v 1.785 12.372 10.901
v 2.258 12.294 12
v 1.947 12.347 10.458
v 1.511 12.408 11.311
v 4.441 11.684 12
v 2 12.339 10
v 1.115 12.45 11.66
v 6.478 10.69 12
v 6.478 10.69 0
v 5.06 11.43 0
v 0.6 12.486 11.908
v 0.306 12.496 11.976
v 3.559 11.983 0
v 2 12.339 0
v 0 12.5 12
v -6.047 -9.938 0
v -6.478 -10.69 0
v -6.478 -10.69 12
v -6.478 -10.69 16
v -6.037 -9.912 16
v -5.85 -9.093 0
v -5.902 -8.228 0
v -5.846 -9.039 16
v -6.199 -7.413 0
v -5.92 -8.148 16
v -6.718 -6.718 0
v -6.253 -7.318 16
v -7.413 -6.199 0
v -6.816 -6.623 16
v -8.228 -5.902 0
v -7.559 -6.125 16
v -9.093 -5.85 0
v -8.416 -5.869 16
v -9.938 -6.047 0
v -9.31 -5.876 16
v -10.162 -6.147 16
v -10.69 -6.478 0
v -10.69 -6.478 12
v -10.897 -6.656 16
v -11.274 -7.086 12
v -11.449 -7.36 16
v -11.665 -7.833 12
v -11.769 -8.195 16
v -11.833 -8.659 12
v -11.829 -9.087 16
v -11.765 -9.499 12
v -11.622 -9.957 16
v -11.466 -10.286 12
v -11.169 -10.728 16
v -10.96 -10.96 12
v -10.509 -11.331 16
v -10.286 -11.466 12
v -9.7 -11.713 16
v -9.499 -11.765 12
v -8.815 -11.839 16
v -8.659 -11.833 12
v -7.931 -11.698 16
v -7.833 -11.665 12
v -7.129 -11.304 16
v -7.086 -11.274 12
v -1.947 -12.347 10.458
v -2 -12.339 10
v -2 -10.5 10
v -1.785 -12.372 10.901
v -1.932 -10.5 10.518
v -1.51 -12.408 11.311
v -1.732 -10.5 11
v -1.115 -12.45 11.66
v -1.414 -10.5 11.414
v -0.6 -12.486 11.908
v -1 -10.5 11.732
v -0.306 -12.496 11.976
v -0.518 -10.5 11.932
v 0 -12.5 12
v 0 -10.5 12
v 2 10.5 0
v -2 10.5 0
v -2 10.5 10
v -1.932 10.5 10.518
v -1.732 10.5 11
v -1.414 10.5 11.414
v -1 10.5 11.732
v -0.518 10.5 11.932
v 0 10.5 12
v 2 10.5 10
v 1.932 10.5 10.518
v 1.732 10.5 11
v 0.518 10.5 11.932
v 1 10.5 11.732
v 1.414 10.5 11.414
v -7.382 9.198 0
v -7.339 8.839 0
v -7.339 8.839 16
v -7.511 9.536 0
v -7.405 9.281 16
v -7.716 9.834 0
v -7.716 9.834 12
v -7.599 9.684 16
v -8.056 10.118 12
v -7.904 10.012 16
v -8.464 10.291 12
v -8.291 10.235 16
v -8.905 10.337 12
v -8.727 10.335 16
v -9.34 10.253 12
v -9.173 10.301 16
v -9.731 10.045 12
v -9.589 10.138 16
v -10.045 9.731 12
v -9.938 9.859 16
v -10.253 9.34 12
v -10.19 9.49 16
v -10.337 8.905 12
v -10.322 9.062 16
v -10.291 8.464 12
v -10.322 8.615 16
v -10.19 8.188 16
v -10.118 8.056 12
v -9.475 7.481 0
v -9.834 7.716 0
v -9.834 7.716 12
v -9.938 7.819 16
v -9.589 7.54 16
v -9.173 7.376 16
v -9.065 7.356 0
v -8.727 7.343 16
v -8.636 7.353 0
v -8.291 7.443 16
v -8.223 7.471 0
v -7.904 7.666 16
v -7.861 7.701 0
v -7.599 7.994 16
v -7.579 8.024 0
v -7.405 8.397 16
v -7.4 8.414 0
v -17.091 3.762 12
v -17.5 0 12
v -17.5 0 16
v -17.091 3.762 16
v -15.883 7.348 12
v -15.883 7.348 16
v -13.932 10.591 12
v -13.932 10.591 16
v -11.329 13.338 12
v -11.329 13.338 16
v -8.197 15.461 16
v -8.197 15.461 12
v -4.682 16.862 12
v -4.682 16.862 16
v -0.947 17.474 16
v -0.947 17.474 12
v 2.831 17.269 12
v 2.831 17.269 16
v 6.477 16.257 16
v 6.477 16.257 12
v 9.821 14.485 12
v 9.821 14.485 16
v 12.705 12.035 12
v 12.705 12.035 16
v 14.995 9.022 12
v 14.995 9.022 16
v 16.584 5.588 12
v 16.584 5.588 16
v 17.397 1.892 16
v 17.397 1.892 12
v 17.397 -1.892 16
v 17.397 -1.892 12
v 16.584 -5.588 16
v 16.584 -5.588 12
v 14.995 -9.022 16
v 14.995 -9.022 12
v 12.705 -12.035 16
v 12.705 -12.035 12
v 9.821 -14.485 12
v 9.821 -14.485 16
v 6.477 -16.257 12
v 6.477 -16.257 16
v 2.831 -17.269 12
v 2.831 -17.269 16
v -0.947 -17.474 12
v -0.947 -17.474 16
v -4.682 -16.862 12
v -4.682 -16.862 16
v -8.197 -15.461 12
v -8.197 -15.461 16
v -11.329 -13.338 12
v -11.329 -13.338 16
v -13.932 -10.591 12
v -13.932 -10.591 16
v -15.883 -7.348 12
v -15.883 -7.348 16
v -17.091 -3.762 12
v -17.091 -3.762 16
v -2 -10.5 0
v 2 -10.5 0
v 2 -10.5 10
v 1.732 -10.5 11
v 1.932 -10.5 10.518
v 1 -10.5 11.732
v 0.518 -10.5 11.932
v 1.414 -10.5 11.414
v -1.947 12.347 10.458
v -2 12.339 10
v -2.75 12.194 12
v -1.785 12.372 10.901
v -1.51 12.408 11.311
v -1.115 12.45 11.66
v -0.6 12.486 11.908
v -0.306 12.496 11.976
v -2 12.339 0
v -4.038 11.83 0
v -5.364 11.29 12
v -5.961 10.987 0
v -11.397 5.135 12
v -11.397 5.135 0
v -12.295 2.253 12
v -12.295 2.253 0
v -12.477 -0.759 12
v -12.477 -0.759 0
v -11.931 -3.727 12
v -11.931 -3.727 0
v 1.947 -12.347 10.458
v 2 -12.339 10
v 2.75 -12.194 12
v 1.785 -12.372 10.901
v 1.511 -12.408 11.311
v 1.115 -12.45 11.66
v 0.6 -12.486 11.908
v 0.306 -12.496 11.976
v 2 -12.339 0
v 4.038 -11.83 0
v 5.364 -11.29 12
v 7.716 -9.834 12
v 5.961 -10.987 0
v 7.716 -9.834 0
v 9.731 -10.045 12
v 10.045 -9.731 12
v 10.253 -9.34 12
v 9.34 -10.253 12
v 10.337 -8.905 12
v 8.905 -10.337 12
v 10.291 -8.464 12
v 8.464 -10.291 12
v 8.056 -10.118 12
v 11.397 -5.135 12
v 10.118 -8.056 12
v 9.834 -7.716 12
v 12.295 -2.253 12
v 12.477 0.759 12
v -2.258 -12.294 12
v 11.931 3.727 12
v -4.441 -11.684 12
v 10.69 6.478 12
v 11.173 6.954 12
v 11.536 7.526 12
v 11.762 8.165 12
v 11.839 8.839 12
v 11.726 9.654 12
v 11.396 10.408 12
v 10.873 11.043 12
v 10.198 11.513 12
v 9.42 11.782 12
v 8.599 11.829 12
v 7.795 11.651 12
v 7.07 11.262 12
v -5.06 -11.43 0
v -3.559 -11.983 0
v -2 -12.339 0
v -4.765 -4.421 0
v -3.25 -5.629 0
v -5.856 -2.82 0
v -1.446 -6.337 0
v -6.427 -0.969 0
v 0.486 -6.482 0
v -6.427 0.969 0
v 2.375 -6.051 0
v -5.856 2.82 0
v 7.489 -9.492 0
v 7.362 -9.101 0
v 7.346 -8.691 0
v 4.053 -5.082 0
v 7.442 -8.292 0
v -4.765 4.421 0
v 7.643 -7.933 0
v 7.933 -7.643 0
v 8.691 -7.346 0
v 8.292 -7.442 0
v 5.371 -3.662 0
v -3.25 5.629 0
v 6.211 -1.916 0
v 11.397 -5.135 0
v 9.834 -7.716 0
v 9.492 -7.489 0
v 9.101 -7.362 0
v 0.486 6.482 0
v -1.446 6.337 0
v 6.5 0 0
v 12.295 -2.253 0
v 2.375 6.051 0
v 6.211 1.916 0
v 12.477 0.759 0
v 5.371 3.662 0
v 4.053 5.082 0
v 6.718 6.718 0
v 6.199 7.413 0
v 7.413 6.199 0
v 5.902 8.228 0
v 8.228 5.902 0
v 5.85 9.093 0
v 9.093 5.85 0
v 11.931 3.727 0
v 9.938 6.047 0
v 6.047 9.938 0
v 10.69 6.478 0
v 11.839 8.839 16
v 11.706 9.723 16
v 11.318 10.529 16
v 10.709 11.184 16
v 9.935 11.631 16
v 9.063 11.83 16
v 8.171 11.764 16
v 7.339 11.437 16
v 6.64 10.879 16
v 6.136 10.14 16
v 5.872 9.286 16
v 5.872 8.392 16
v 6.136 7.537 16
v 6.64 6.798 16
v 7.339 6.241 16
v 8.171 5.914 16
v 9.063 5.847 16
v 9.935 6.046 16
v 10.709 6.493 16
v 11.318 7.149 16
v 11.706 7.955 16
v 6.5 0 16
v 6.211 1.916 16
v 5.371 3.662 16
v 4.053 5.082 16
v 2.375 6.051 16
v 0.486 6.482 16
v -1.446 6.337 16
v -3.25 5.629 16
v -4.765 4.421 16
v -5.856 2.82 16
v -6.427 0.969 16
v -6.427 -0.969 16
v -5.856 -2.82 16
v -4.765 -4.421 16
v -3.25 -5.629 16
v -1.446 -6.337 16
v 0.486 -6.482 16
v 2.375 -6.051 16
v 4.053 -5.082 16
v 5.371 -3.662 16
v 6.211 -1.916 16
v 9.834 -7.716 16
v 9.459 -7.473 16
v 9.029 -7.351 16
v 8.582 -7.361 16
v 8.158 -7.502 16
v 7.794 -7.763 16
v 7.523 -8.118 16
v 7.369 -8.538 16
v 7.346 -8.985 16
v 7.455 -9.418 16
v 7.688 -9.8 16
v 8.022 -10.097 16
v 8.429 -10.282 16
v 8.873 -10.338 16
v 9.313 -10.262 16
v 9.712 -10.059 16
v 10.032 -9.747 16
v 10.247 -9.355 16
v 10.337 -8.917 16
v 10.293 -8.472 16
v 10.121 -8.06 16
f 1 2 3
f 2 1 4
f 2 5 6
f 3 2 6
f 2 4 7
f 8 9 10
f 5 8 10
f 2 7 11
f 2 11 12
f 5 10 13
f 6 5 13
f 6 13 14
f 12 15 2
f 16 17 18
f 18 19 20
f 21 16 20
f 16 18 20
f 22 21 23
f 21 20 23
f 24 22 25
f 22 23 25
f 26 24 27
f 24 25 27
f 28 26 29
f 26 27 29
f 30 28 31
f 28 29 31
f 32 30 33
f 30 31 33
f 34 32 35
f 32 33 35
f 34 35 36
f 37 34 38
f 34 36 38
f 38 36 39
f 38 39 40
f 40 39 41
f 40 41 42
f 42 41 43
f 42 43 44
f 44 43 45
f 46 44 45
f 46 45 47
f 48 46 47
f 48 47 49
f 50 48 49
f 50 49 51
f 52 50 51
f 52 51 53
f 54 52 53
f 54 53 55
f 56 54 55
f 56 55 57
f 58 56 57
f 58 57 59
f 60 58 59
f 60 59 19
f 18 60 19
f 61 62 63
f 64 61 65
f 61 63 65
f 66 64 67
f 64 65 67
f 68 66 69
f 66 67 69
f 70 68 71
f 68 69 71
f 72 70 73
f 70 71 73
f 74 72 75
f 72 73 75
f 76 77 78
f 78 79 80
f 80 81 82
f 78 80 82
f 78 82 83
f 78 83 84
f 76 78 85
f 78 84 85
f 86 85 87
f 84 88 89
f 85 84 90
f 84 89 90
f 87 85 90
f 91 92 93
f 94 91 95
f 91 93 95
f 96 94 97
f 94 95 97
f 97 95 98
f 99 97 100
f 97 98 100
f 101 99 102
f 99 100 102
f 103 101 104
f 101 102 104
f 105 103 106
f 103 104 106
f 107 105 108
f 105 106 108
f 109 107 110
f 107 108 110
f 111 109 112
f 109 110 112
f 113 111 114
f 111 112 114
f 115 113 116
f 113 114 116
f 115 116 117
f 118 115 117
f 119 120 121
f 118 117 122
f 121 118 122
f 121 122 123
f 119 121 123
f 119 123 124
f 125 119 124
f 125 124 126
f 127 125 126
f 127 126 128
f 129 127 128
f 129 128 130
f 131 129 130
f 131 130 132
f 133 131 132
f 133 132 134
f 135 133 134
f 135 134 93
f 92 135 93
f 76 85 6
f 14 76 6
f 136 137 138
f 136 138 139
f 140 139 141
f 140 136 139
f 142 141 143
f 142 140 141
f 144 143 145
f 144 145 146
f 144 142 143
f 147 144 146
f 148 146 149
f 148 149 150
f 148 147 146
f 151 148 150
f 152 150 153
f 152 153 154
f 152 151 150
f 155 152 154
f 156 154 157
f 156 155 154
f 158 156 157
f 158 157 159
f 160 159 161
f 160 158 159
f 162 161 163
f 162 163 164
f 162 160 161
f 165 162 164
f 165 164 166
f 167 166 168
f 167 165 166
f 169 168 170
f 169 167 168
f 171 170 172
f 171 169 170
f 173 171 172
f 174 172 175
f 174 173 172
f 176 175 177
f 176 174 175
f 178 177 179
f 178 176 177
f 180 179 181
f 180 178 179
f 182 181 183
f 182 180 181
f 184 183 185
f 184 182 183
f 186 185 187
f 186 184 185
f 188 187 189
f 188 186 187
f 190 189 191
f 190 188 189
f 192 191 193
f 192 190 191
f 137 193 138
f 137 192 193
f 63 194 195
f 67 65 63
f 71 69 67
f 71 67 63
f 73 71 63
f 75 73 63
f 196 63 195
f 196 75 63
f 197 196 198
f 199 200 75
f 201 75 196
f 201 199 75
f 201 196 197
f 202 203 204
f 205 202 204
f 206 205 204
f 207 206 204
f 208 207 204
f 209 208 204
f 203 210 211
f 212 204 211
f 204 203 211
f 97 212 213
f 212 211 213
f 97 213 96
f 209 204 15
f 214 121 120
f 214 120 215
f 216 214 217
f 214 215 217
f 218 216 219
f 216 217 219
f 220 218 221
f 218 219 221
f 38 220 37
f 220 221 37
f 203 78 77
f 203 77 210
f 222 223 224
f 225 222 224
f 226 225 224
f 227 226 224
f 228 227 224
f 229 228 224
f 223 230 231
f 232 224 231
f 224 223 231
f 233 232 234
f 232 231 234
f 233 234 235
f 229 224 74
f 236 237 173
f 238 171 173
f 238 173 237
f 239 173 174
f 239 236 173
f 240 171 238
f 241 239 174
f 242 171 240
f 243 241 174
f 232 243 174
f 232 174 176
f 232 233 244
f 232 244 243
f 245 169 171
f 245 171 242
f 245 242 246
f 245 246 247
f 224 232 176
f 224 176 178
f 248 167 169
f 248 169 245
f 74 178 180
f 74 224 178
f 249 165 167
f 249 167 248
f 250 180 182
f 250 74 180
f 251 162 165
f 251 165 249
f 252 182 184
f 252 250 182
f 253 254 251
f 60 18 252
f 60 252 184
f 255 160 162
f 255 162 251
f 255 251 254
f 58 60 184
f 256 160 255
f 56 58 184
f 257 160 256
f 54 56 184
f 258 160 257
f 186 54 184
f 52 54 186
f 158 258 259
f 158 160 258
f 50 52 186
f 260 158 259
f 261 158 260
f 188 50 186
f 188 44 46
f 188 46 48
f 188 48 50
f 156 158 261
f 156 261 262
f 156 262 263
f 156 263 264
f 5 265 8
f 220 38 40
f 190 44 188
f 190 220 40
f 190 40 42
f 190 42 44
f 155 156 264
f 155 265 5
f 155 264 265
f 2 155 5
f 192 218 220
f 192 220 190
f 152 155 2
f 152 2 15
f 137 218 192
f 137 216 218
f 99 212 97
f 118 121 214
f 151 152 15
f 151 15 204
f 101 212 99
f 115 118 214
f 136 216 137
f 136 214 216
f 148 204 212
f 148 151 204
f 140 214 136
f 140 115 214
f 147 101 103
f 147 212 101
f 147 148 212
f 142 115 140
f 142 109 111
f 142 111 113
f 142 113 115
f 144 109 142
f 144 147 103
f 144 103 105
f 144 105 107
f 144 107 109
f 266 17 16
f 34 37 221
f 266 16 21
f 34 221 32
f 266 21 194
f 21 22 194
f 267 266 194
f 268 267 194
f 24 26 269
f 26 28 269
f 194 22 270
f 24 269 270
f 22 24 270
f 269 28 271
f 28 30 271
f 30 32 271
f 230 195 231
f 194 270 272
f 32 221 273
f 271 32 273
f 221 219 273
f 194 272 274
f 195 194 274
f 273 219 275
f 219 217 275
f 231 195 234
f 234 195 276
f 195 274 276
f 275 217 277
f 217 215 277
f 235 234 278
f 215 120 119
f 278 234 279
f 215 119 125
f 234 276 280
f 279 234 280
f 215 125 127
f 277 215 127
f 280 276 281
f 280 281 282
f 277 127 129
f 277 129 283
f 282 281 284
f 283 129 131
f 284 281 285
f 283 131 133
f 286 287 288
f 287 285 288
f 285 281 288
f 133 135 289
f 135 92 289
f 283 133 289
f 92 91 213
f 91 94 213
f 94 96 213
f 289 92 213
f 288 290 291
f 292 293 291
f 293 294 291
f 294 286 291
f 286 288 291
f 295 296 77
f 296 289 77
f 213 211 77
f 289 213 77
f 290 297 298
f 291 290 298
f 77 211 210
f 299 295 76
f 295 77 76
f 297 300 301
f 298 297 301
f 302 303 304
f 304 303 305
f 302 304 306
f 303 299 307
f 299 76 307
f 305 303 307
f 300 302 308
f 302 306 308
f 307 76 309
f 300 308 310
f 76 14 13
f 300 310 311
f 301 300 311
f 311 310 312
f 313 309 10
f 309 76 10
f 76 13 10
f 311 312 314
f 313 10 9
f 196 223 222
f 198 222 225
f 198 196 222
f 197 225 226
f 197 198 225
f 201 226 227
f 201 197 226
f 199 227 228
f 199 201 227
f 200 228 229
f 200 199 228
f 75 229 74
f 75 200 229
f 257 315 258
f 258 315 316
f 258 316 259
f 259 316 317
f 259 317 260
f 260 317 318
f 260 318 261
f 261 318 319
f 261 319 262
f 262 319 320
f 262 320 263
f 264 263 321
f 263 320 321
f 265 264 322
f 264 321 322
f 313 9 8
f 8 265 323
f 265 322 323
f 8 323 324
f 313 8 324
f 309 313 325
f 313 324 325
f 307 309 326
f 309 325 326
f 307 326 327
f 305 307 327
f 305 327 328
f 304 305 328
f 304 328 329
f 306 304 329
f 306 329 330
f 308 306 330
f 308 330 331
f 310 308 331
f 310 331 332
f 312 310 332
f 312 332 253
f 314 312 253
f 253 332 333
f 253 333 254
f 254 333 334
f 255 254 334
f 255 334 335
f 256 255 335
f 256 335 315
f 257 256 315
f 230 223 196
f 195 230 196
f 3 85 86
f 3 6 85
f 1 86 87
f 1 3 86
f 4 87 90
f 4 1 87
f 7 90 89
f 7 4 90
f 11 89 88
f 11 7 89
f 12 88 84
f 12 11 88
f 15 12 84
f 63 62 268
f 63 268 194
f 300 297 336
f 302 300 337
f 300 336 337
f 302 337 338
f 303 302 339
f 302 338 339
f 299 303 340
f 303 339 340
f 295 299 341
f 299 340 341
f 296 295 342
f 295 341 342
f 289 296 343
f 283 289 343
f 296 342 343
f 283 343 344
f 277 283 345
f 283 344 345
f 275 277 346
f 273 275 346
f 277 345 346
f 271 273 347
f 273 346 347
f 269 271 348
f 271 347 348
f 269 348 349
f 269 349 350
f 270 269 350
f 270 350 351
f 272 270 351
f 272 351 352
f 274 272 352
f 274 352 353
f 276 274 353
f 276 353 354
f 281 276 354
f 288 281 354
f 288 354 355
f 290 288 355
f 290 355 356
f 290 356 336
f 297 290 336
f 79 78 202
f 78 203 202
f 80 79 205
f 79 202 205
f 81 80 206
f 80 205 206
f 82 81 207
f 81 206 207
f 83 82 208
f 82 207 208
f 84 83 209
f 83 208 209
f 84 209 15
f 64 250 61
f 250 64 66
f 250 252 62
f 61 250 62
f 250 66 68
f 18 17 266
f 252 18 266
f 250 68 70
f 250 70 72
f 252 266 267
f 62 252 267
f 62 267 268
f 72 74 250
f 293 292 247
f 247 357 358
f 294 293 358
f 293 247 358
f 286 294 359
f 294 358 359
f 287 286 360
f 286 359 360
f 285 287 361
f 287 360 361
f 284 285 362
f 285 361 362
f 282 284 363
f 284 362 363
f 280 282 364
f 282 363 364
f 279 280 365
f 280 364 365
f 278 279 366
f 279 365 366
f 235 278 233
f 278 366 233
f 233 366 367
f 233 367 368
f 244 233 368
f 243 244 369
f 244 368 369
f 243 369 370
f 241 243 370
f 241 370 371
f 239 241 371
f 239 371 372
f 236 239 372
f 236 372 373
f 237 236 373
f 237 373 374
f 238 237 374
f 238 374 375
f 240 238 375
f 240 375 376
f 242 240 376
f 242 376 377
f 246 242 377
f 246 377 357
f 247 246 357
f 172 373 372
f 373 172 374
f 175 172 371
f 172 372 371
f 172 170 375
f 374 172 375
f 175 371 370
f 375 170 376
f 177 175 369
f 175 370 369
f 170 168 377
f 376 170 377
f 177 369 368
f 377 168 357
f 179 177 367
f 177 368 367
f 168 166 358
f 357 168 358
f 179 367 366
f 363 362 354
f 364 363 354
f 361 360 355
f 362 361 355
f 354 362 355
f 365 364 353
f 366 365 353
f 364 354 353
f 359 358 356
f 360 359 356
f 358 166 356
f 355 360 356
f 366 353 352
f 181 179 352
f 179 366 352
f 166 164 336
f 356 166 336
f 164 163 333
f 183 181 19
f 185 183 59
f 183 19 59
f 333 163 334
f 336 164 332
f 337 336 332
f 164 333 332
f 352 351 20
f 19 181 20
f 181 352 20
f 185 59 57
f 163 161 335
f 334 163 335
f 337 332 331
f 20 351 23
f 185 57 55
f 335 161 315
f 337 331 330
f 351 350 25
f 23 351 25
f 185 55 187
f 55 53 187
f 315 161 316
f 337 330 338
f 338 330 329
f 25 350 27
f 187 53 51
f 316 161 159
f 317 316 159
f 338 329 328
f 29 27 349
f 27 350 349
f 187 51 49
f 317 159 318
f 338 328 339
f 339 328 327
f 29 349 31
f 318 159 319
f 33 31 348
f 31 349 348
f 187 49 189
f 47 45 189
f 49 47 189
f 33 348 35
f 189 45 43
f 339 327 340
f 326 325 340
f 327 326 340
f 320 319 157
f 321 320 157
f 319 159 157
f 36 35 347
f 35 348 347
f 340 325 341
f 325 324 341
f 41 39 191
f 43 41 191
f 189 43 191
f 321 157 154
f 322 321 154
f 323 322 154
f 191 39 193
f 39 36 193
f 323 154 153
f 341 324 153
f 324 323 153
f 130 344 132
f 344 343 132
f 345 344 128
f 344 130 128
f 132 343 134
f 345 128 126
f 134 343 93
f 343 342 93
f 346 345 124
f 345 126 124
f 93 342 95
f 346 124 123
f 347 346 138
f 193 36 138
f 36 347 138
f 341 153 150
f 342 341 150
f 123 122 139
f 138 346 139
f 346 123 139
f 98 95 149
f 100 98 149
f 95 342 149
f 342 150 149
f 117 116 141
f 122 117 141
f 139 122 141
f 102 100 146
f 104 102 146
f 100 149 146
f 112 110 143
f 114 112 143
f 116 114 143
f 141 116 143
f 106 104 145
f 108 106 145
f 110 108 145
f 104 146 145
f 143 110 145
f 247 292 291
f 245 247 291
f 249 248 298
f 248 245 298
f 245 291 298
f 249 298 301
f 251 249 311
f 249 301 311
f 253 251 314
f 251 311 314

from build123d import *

# Parameters (mm, degrees)
SKETCH_1_R          = 12.5
EXTRUDE_1_DEPTH     = 12
SKETCH_2_W          = 4
SKETCH_2_H          = 3.769678913
SKETCH_2_H_2        = 4
CUT_EXTRUDE_1_DEPTH = 22.365860619
SKETCH_3_R          = 6.5
CUT_EXTRUDE_2_DEPTH = 22.272047386
SKETCH_5_R          = 17.5
EXTRUDE_1_2_DEPTH   = 4
SKETCH_4_R          = 3
SKETCH_4_R_2        = 1.5
SKETCH_4_R_3        = 6.5
CUT_EXTRUDE_3_DEPTH = 30.470324057
FILLET_2_R          = 2


with BuildPart() as part:
    # 草图1 → Extrude 1 (new body)
    with BuildSketch(Plane.XY):
        Circle(SKETCH_1_R)
    extrude(amount=EXTRUDE_1_DEPTH)

    # 草图2 → 切除-拉伸1 (cut, through all)
    with BuildSketch(Plane.XY.offset(12)):
        with Locations((0, -12.384839456)):
            Rectangle(SKETCH_2_W, SKETCH_2_H)
        with Locations((0, 12.5)):
            Rectangle(SKETCH_2_W, SKETCH_2_H_2)
    extrude(amount=-CUT_EXTRUDE_1_DEPTH, mode=Mode.SUBTRACT)

    # 草图3 → 切除-拉伸2 (cut, through all)
    with BuildSketch(Plane.XY.offset(12)):
        Circle(SKETCH_3_R)
    extrude(amount=-CUT_EXTRUDE_2_DEPTH, mode=Mode.SUBTRACT)

    # 草图5 → Extrude 1 2 (add)
    with BuildSketch(Plane(origin=(0, 0, 12), x_dir=(-1, 0, 0), z_dir=(0, 0, -1))):
        Circle(SKETCH_5_R)
    extrude(amount=-EXTRUDE_1_2_DEPTH)

    # 草图4 → 切除-拉伸3 (cut, through all)
    with BuildSketch(Plane.XY.offset(16)):
        with Locations((8.838834765, 8.838834765)):
            Circle(SKETCH_4_R)
        with Locations((-8.838834765, 8.838834765)):
            Circle(SKETCH_4_R_2)
        with Locations(Location((-8.838834765, -8.838834765, 0), (0, 0, 321.892102579))):
            Circle(SKETCH_4_R)
        with Locations(Location((8.838834765, -8.838834765, 0), (0, 0, 48.439812768))):
            Circle(SKETCH_4_R_2)
        Circle(SKETCH_4_R_3)
    extrude(amount=-CUT_EXTRUDE_3_DEPTH, mode=Mode.SUBTRACT)

    # 圆角2
    fillet_2_edges = [part.edges().sort_by_distance(p)[0] for p in [
        (-2, -11.41948134, 12),
        (2, -11.41948134, 12),
        (2, 11.41948134, 12),
        (-2, 11.41948134, 12),
    ]]
    fillet(fillet_2_edges, radius=FILLET_2_R - 0.0001)  # a hair under: the kernel refuses the full size


solid = part.part
